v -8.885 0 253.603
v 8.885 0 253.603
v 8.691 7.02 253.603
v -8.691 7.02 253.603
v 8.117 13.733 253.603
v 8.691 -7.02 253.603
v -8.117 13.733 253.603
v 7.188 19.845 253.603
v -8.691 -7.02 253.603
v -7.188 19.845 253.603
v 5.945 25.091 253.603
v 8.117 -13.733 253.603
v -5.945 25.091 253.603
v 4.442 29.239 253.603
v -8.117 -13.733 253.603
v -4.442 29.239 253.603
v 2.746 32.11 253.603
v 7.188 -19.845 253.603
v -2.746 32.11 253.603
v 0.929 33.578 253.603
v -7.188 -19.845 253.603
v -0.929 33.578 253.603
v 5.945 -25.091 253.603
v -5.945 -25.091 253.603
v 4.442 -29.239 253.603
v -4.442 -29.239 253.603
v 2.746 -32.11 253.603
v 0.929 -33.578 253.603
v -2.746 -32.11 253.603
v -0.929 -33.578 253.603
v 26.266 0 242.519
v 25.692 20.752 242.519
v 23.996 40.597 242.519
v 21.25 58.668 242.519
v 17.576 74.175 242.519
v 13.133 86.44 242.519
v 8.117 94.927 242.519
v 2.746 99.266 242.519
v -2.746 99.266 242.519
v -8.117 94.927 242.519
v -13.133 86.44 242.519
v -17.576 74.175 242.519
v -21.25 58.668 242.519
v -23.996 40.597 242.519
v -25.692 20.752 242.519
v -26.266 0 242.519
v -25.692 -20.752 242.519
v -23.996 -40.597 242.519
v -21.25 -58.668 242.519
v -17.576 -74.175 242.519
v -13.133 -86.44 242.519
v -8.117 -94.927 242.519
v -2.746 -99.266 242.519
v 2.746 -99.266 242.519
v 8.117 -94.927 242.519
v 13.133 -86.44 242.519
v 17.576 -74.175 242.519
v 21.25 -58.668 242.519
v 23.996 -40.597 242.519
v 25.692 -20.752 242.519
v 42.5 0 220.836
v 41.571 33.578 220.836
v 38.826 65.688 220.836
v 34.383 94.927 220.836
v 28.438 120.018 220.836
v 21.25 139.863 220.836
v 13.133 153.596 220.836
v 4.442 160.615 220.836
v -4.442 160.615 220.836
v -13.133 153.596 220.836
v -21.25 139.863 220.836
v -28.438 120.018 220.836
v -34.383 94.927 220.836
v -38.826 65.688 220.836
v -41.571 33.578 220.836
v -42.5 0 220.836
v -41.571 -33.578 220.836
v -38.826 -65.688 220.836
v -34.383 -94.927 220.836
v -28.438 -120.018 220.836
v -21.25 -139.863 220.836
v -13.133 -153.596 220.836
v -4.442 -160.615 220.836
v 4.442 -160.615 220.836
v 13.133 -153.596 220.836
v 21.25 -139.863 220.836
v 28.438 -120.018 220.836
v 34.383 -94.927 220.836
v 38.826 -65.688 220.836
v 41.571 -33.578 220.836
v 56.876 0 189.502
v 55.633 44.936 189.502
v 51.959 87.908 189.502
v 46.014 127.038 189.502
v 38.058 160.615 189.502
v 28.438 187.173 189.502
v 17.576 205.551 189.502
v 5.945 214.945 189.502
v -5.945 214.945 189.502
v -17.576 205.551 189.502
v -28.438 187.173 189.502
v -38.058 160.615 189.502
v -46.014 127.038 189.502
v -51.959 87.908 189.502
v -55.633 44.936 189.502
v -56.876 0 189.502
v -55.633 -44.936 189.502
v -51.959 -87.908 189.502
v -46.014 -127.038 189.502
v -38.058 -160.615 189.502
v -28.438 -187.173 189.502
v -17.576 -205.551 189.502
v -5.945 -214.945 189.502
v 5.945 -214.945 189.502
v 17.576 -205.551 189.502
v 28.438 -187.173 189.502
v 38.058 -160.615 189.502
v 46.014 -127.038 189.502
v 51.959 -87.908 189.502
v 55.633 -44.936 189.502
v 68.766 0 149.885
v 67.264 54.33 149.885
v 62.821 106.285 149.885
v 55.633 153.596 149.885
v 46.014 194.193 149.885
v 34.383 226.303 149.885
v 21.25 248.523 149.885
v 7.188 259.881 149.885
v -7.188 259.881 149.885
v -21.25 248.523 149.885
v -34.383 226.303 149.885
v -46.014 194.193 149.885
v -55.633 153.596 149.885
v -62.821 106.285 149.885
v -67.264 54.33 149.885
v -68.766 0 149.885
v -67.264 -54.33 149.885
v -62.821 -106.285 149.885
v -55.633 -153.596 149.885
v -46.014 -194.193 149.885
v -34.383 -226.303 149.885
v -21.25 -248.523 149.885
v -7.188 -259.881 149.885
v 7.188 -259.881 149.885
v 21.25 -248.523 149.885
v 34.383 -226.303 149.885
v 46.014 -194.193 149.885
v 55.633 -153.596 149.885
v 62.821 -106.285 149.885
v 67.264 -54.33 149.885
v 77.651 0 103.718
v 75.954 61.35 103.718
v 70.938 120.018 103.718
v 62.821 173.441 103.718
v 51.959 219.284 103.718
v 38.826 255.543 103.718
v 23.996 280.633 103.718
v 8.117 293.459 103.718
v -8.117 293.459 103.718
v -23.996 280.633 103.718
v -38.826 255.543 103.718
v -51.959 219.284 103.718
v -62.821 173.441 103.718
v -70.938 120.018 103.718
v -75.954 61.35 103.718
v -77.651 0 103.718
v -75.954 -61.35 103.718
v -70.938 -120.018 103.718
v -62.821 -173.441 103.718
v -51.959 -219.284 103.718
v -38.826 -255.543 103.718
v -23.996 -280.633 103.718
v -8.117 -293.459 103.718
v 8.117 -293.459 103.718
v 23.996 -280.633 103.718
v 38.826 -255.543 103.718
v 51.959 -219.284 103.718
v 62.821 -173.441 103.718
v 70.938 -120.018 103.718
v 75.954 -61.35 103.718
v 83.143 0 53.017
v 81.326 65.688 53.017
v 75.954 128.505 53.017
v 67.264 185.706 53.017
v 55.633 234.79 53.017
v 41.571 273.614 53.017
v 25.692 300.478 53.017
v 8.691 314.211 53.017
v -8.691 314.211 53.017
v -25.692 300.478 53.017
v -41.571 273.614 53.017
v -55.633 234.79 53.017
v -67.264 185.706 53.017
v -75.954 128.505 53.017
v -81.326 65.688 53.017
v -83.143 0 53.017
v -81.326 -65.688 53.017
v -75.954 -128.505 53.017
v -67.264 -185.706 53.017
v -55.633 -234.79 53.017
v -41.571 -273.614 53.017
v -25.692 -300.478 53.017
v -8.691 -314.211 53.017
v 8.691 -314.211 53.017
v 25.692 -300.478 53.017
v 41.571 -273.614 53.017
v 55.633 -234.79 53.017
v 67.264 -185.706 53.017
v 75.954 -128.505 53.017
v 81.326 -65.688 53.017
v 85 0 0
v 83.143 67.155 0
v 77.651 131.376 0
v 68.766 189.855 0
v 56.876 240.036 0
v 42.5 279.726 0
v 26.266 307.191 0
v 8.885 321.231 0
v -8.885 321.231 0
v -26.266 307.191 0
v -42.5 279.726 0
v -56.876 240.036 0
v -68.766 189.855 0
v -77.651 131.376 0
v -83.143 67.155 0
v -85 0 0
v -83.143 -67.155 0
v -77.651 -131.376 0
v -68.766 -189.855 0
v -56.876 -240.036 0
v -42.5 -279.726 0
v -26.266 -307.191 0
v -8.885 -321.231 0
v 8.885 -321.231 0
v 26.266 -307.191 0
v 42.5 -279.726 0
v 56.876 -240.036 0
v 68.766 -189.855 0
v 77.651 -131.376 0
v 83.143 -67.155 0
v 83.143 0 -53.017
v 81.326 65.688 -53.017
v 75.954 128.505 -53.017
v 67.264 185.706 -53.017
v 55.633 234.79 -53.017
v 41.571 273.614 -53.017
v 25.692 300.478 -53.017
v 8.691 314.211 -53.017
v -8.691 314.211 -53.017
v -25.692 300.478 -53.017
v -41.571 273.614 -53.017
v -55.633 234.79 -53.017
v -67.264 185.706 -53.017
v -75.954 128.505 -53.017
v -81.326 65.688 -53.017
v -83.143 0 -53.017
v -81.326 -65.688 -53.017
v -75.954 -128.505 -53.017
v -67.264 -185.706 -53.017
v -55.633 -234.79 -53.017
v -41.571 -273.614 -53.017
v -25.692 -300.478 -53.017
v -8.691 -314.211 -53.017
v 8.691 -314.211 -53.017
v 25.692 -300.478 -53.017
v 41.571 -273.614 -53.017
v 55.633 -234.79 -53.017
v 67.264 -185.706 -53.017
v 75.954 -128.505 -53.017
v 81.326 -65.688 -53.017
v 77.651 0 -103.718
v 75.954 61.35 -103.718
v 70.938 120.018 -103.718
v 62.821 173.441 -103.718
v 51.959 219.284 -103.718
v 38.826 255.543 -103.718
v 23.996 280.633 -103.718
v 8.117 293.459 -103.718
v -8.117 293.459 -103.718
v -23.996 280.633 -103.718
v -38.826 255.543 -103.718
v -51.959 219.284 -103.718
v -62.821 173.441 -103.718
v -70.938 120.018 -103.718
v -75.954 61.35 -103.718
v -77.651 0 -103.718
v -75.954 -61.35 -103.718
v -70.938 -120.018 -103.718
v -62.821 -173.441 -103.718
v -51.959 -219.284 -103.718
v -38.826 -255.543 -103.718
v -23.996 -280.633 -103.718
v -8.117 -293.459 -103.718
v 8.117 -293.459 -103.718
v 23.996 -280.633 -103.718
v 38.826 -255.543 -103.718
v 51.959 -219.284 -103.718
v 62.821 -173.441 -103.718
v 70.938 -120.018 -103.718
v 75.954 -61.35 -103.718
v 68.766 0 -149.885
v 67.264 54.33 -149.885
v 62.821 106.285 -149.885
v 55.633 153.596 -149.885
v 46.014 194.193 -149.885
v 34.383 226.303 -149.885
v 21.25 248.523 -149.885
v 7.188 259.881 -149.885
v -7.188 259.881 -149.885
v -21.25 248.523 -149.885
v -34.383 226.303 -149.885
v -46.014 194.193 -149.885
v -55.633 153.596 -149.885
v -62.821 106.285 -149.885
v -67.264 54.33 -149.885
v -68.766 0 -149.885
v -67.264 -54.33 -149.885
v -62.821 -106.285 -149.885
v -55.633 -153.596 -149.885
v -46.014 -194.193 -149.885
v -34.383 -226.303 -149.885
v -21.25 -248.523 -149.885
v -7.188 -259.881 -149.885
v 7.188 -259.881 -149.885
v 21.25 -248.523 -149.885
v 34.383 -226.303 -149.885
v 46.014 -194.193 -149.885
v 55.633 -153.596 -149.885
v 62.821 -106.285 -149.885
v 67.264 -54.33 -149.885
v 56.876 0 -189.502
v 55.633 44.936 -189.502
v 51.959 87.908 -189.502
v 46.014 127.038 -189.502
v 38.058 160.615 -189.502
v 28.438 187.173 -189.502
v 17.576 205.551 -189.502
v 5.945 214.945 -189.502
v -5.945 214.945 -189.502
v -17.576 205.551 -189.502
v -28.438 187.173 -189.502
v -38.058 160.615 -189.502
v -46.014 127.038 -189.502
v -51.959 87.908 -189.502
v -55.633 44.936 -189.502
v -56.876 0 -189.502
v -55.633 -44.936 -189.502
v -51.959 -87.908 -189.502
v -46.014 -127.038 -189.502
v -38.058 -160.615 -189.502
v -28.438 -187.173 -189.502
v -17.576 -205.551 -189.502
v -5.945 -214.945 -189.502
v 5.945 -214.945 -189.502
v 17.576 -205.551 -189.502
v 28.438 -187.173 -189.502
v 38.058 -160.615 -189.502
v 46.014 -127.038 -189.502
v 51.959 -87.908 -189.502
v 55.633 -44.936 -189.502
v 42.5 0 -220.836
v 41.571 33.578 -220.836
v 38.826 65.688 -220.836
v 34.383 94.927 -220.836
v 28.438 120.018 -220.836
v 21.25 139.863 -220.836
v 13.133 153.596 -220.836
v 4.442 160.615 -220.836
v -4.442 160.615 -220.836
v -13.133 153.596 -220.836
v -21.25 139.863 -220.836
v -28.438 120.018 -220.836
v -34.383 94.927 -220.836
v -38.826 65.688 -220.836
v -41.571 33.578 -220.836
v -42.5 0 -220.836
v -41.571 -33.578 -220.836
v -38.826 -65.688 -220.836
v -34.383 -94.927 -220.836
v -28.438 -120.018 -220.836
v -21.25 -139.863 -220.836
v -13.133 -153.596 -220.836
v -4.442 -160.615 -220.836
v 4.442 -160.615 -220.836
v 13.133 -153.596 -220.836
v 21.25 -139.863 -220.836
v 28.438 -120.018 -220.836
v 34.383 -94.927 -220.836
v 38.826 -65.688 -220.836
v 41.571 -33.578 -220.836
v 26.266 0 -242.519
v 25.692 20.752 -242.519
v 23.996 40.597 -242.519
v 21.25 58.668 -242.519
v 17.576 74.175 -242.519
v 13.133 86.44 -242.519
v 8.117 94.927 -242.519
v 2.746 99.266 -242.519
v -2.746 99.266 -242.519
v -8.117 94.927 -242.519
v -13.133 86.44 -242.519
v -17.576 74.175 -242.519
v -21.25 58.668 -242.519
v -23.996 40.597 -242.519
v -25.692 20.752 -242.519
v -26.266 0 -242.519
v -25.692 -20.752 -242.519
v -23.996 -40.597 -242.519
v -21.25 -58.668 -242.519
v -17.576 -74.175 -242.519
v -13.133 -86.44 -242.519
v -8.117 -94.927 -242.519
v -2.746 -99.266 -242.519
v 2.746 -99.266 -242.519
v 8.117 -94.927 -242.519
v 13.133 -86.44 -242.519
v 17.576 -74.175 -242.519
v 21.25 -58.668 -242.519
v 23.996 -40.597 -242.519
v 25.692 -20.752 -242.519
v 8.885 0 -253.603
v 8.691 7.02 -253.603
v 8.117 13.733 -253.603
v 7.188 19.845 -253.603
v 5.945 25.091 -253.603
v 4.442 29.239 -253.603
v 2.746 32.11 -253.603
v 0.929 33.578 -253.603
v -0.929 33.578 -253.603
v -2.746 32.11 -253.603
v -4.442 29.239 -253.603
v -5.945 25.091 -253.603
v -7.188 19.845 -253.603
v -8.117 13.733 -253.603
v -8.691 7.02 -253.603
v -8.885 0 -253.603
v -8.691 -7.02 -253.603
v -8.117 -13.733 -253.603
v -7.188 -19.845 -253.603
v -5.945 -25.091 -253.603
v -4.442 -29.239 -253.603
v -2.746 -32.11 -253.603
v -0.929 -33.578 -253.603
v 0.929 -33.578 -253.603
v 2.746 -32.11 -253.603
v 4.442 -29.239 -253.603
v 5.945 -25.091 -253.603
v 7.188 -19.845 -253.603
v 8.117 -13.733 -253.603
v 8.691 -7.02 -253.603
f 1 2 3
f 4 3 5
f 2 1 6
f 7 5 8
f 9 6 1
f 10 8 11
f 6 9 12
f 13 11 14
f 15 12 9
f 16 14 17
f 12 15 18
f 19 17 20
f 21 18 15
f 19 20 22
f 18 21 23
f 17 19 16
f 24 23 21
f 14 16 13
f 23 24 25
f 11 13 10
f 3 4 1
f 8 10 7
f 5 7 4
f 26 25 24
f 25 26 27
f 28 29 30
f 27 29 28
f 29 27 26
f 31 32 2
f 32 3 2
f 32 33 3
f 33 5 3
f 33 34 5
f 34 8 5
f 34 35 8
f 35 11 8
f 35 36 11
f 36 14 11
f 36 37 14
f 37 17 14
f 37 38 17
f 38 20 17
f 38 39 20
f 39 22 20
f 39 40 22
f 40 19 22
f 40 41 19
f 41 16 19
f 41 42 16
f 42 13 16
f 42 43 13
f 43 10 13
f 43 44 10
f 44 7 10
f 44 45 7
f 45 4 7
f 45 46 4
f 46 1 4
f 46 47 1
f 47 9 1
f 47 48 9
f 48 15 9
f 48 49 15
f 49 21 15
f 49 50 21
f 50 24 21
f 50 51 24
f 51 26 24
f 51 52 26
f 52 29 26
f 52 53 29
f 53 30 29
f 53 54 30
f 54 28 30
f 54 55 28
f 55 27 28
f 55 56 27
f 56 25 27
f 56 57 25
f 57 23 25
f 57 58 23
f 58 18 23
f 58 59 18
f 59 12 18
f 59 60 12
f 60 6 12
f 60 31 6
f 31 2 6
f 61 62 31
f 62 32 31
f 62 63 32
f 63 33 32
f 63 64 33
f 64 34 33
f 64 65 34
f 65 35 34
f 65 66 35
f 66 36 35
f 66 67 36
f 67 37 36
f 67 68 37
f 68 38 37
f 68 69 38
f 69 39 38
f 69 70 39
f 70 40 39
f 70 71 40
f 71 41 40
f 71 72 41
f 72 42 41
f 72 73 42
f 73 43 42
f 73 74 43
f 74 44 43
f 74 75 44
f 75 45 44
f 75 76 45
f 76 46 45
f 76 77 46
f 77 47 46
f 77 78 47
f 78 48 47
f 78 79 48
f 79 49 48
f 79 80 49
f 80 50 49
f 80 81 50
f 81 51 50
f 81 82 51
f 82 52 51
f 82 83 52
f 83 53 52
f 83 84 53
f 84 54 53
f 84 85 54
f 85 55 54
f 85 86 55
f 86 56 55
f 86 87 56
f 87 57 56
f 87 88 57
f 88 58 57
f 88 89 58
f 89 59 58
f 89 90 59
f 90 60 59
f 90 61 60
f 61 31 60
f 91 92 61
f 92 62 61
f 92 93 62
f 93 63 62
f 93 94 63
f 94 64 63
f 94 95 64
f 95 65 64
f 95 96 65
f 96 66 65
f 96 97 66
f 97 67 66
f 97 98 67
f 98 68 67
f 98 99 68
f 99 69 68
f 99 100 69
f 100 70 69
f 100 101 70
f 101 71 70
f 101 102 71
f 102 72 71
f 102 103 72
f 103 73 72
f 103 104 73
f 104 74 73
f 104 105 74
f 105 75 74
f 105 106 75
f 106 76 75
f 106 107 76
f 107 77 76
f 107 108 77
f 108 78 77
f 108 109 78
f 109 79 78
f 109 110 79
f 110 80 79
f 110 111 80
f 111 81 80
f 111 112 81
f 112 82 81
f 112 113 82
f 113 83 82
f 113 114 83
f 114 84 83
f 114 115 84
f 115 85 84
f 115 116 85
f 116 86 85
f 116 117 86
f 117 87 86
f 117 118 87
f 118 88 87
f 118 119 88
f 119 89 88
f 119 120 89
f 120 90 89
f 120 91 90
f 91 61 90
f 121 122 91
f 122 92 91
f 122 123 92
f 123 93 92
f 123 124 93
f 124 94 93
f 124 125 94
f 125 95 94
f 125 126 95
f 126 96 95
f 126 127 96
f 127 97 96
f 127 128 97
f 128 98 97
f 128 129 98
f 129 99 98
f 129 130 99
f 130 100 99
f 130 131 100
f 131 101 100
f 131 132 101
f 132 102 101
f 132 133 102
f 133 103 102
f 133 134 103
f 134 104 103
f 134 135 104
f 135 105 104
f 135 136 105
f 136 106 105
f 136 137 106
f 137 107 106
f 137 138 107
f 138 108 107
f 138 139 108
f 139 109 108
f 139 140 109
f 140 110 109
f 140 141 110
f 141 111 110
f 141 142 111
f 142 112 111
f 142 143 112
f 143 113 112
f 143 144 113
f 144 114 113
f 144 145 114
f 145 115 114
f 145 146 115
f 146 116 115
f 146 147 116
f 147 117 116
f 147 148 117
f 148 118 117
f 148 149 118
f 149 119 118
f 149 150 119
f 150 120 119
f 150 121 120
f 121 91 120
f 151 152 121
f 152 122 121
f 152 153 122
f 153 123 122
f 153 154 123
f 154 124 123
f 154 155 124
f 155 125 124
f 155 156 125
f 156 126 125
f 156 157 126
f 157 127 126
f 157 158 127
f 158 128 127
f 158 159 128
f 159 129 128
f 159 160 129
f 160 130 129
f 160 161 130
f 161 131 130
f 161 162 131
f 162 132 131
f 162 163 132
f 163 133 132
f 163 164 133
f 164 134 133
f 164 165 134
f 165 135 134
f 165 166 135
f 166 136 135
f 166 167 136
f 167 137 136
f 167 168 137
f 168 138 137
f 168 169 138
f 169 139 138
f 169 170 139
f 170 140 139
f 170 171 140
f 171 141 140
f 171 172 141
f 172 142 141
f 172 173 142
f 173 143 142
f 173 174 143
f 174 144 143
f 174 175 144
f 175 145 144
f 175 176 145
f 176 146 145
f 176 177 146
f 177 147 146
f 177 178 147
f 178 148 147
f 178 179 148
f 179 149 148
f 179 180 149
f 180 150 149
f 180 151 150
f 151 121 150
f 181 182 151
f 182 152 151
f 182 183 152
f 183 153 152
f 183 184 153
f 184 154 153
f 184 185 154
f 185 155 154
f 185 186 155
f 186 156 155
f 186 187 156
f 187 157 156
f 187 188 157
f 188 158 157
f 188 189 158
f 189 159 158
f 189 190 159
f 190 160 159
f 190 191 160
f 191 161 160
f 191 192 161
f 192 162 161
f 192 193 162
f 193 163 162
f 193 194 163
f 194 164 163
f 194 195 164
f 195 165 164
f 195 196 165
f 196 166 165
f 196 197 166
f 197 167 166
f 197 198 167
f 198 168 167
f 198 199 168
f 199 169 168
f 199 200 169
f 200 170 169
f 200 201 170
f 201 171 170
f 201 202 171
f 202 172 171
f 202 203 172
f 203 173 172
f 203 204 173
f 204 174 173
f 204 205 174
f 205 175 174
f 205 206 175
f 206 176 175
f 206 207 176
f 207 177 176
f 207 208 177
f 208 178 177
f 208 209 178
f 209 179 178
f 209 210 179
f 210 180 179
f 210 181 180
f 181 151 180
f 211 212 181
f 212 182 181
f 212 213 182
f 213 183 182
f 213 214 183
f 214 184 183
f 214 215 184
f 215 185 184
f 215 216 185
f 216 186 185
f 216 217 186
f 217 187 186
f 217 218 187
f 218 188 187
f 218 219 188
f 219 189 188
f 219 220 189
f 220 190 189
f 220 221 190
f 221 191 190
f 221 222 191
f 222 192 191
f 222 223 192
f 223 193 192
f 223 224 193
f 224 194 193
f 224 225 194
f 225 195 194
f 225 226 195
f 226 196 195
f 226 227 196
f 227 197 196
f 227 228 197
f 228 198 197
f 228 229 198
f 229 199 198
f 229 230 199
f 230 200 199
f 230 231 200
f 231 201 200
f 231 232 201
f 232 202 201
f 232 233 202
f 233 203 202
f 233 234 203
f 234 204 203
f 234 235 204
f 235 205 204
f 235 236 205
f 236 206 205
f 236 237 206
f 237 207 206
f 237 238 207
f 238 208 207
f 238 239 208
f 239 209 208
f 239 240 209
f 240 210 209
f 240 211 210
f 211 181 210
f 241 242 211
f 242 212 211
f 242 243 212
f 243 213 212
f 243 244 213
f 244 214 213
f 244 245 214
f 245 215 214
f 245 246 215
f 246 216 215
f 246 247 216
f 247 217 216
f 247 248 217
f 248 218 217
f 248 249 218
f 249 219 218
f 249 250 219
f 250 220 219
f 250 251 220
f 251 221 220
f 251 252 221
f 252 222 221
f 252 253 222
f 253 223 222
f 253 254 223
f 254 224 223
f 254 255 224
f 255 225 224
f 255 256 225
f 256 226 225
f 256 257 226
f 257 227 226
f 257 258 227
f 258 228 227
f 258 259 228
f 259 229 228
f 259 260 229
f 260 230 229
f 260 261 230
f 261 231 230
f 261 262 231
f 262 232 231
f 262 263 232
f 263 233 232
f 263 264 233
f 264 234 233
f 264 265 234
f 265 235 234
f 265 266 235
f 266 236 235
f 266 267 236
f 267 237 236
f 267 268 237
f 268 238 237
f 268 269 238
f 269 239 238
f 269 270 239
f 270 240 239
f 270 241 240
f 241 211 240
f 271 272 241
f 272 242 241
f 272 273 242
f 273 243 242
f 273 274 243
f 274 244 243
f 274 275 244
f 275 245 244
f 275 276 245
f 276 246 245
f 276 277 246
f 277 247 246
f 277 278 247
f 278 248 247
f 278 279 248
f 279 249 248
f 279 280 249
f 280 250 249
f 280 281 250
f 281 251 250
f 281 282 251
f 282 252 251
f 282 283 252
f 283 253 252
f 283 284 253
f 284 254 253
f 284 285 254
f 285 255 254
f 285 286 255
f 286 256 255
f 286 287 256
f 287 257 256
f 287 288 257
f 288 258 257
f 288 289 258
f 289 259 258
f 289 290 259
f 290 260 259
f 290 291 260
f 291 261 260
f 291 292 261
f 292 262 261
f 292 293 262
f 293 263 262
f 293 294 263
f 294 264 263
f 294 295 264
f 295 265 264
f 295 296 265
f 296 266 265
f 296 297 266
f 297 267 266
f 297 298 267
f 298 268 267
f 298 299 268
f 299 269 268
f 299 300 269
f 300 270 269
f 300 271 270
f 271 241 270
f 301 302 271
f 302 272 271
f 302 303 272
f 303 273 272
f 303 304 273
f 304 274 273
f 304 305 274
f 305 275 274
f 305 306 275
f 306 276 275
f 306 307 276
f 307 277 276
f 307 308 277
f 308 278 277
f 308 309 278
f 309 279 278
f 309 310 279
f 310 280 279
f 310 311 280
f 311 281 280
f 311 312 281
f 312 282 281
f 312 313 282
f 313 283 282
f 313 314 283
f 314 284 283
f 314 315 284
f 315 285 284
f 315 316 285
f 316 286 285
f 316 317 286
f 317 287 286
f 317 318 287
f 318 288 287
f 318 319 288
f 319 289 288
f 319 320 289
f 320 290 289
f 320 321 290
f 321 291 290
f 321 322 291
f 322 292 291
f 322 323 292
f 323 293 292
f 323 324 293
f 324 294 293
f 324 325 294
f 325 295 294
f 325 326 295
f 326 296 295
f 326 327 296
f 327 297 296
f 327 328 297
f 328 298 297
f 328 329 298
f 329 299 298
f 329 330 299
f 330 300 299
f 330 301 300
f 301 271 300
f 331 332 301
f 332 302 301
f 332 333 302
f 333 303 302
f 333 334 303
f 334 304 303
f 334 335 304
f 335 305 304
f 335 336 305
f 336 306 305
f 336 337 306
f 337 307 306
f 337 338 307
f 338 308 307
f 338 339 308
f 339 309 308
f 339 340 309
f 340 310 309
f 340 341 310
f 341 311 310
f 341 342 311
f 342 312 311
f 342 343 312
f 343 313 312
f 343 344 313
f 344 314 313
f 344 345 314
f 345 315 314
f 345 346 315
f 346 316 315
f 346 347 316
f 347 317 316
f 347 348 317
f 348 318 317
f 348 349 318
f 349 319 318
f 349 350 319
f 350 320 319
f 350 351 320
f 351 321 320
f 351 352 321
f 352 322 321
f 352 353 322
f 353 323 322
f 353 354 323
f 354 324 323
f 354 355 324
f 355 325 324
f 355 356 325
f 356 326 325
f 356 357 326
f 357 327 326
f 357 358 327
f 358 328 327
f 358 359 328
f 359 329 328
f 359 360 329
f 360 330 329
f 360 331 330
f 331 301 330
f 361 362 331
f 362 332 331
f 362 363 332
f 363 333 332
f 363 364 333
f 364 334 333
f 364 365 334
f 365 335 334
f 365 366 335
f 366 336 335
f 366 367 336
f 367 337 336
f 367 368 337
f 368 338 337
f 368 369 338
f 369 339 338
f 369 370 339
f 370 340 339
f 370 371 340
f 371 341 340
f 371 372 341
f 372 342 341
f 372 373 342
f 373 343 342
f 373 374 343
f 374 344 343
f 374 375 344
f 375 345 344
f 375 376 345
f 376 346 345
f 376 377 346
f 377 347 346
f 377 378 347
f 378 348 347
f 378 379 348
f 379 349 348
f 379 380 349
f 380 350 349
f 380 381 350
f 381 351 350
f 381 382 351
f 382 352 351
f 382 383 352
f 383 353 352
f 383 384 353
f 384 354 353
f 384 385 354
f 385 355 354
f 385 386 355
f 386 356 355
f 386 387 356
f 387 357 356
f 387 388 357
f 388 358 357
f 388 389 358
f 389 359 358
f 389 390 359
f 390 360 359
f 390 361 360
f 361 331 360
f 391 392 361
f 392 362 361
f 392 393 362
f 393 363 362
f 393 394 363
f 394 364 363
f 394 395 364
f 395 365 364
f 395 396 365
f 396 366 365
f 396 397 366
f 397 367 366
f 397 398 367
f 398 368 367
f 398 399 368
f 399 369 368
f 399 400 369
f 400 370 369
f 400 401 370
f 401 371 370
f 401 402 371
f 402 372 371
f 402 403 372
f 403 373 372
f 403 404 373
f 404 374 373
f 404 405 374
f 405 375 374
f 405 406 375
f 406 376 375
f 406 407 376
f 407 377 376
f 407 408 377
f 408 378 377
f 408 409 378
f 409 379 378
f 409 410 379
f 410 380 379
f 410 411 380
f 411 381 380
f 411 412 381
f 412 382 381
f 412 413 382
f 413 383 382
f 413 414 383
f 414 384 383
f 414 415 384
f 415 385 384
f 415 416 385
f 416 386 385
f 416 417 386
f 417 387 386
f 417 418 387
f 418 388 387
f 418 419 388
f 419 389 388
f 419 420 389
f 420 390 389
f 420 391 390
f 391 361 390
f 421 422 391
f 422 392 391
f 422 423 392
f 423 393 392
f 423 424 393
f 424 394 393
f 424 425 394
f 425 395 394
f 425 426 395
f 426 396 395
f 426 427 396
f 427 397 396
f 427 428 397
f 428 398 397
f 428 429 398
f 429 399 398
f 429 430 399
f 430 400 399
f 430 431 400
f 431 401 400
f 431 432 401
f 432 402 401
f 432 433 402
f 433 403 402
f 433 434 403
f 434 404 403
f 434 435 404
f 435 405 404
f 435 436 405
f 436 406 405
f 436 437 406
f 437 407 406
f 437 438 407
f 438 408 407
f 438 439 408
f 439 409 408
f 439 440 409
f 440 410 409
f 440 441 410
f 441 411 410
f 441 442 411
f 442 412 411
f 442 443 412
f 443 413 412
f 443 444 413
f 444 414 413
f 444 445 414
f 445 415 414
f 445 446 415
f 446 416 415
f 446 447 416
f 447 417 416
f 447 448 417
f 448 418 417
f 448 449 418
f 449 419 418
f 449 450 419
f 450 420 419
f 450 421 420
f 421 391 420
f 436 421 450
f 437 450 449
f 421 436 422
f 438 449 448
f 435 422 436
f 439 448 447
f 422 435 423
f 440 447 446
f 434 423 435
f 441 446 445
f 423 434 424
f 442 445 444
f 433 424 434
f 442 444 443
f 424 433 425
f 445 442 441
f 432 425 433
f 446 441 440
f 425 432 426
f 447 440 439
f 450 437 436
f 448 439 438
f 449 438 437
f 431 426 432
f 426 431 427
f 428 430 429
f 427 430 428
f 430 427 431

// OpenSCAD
// Generated by SolidPython 1.0.1 on 2020-07-29 00:46:47


scale(v = [5, 19, 15]) {
	sphere(r = 17);
}
/***********************************************
*********      SolidPython code:      **********
************************************************
 
# import packages: SolidPython
from solid import *
from solid.utils import *
from itertools import chain, combinations, permutations


class Resize:

    def __init__(self, scad_file):
        self.scad_file = scad_file
        #self.scad_file = import_scad(scad_file)
        # cone/cylinder param:
        self.r1 = 0
        self.r2 = 0
        self.h = 0
        # rectangular prism param:
        self.w = 0
        self.l = 0
        # ellipse param:
        self.r = 0

    # import OpenScad code (file name corresponds to shape)


    # classify shape + parameters
    def assign(self, param1, param2, param3):
        if self.scad_file == 'cone.scad':
            self.r1 = param1
            self.r2 = param2
            self.h = param3
        elif self.scad_file == 'cylinder.scad':
            self.r1 = param1
            self.r2 = param2
            self.h = param3
        elif self.scad_file == 'rectangularPrism.scad':
            self.h = param1
            self.l = param2
            self.w = param3
        else:
            self.r = param1
            self.h = param2

    # resize parameters
    def iterate(self):
        x = range(3, 20, 2)
        i = 1
        if self.scad_file == 'cone.scad':
            tempList = list(permutations(x, 2))
            for temp in tempList:
                param1 = temp[0]
                param2 = temp[1]
                filepath = 'produced_scad_files/' + 'cone' + str(param1) + '_' + str(param2) + '_' + '.scad'
                scad_render_to_file(cylinder(h=param1, r1=param2, r2=0), filepath)

        elif self.scad_file == 'cylinder.scad':
            tempList = list(permutations(x, 3))
            for temp in tempList:
                param1 = temp[0]
                param2 = temp[1]
                filepath = 'produced_scad_files/' + 'cylinder' + str(param1) + '_' + str(param2) + '_' + '.scad'
                scad_render_to_file(cylinder(h=param1, r1=param2, r2=param2), filepath)

        elif self.scad_file == 'rectangularPrism.scad':
            tempList = list(permutations(x, 3))
            for temp in tempList:
                param1 = temp[0]
                param2 = temp[1]
                param3 = temp[2]
                filepath = 'produced_scad_files/' + 'rectangularPrism' + str(param1) + '_' + str(param2) + '_' + str(
                    param3) + '.scad'
                scad_render_to_file(cube(size=(param1, param2, param3)), filepath)

        elif self.scad_file == 'ellipse.scad':
            tempList = list(permutations(x, 4))
            for temp in tempList:
                param1 = temp[0]
                param2 = temp[1]
                param3 = temp[2]
                param4 = temp[3]
                filepath = 'produced_scad_files/' + 'ellipse' + str(param1) + '_' + str(param2) + '_' + str(param3) + '_' + str(param4) + '.scad'
                scad_render_to_file(scale([param1, param2, param3])(sphere(r=param4)), filepath)

    def render_to_scadfile(self):
        scad_render_to_file(scad, 'example.scad') 
 
************************************************/
